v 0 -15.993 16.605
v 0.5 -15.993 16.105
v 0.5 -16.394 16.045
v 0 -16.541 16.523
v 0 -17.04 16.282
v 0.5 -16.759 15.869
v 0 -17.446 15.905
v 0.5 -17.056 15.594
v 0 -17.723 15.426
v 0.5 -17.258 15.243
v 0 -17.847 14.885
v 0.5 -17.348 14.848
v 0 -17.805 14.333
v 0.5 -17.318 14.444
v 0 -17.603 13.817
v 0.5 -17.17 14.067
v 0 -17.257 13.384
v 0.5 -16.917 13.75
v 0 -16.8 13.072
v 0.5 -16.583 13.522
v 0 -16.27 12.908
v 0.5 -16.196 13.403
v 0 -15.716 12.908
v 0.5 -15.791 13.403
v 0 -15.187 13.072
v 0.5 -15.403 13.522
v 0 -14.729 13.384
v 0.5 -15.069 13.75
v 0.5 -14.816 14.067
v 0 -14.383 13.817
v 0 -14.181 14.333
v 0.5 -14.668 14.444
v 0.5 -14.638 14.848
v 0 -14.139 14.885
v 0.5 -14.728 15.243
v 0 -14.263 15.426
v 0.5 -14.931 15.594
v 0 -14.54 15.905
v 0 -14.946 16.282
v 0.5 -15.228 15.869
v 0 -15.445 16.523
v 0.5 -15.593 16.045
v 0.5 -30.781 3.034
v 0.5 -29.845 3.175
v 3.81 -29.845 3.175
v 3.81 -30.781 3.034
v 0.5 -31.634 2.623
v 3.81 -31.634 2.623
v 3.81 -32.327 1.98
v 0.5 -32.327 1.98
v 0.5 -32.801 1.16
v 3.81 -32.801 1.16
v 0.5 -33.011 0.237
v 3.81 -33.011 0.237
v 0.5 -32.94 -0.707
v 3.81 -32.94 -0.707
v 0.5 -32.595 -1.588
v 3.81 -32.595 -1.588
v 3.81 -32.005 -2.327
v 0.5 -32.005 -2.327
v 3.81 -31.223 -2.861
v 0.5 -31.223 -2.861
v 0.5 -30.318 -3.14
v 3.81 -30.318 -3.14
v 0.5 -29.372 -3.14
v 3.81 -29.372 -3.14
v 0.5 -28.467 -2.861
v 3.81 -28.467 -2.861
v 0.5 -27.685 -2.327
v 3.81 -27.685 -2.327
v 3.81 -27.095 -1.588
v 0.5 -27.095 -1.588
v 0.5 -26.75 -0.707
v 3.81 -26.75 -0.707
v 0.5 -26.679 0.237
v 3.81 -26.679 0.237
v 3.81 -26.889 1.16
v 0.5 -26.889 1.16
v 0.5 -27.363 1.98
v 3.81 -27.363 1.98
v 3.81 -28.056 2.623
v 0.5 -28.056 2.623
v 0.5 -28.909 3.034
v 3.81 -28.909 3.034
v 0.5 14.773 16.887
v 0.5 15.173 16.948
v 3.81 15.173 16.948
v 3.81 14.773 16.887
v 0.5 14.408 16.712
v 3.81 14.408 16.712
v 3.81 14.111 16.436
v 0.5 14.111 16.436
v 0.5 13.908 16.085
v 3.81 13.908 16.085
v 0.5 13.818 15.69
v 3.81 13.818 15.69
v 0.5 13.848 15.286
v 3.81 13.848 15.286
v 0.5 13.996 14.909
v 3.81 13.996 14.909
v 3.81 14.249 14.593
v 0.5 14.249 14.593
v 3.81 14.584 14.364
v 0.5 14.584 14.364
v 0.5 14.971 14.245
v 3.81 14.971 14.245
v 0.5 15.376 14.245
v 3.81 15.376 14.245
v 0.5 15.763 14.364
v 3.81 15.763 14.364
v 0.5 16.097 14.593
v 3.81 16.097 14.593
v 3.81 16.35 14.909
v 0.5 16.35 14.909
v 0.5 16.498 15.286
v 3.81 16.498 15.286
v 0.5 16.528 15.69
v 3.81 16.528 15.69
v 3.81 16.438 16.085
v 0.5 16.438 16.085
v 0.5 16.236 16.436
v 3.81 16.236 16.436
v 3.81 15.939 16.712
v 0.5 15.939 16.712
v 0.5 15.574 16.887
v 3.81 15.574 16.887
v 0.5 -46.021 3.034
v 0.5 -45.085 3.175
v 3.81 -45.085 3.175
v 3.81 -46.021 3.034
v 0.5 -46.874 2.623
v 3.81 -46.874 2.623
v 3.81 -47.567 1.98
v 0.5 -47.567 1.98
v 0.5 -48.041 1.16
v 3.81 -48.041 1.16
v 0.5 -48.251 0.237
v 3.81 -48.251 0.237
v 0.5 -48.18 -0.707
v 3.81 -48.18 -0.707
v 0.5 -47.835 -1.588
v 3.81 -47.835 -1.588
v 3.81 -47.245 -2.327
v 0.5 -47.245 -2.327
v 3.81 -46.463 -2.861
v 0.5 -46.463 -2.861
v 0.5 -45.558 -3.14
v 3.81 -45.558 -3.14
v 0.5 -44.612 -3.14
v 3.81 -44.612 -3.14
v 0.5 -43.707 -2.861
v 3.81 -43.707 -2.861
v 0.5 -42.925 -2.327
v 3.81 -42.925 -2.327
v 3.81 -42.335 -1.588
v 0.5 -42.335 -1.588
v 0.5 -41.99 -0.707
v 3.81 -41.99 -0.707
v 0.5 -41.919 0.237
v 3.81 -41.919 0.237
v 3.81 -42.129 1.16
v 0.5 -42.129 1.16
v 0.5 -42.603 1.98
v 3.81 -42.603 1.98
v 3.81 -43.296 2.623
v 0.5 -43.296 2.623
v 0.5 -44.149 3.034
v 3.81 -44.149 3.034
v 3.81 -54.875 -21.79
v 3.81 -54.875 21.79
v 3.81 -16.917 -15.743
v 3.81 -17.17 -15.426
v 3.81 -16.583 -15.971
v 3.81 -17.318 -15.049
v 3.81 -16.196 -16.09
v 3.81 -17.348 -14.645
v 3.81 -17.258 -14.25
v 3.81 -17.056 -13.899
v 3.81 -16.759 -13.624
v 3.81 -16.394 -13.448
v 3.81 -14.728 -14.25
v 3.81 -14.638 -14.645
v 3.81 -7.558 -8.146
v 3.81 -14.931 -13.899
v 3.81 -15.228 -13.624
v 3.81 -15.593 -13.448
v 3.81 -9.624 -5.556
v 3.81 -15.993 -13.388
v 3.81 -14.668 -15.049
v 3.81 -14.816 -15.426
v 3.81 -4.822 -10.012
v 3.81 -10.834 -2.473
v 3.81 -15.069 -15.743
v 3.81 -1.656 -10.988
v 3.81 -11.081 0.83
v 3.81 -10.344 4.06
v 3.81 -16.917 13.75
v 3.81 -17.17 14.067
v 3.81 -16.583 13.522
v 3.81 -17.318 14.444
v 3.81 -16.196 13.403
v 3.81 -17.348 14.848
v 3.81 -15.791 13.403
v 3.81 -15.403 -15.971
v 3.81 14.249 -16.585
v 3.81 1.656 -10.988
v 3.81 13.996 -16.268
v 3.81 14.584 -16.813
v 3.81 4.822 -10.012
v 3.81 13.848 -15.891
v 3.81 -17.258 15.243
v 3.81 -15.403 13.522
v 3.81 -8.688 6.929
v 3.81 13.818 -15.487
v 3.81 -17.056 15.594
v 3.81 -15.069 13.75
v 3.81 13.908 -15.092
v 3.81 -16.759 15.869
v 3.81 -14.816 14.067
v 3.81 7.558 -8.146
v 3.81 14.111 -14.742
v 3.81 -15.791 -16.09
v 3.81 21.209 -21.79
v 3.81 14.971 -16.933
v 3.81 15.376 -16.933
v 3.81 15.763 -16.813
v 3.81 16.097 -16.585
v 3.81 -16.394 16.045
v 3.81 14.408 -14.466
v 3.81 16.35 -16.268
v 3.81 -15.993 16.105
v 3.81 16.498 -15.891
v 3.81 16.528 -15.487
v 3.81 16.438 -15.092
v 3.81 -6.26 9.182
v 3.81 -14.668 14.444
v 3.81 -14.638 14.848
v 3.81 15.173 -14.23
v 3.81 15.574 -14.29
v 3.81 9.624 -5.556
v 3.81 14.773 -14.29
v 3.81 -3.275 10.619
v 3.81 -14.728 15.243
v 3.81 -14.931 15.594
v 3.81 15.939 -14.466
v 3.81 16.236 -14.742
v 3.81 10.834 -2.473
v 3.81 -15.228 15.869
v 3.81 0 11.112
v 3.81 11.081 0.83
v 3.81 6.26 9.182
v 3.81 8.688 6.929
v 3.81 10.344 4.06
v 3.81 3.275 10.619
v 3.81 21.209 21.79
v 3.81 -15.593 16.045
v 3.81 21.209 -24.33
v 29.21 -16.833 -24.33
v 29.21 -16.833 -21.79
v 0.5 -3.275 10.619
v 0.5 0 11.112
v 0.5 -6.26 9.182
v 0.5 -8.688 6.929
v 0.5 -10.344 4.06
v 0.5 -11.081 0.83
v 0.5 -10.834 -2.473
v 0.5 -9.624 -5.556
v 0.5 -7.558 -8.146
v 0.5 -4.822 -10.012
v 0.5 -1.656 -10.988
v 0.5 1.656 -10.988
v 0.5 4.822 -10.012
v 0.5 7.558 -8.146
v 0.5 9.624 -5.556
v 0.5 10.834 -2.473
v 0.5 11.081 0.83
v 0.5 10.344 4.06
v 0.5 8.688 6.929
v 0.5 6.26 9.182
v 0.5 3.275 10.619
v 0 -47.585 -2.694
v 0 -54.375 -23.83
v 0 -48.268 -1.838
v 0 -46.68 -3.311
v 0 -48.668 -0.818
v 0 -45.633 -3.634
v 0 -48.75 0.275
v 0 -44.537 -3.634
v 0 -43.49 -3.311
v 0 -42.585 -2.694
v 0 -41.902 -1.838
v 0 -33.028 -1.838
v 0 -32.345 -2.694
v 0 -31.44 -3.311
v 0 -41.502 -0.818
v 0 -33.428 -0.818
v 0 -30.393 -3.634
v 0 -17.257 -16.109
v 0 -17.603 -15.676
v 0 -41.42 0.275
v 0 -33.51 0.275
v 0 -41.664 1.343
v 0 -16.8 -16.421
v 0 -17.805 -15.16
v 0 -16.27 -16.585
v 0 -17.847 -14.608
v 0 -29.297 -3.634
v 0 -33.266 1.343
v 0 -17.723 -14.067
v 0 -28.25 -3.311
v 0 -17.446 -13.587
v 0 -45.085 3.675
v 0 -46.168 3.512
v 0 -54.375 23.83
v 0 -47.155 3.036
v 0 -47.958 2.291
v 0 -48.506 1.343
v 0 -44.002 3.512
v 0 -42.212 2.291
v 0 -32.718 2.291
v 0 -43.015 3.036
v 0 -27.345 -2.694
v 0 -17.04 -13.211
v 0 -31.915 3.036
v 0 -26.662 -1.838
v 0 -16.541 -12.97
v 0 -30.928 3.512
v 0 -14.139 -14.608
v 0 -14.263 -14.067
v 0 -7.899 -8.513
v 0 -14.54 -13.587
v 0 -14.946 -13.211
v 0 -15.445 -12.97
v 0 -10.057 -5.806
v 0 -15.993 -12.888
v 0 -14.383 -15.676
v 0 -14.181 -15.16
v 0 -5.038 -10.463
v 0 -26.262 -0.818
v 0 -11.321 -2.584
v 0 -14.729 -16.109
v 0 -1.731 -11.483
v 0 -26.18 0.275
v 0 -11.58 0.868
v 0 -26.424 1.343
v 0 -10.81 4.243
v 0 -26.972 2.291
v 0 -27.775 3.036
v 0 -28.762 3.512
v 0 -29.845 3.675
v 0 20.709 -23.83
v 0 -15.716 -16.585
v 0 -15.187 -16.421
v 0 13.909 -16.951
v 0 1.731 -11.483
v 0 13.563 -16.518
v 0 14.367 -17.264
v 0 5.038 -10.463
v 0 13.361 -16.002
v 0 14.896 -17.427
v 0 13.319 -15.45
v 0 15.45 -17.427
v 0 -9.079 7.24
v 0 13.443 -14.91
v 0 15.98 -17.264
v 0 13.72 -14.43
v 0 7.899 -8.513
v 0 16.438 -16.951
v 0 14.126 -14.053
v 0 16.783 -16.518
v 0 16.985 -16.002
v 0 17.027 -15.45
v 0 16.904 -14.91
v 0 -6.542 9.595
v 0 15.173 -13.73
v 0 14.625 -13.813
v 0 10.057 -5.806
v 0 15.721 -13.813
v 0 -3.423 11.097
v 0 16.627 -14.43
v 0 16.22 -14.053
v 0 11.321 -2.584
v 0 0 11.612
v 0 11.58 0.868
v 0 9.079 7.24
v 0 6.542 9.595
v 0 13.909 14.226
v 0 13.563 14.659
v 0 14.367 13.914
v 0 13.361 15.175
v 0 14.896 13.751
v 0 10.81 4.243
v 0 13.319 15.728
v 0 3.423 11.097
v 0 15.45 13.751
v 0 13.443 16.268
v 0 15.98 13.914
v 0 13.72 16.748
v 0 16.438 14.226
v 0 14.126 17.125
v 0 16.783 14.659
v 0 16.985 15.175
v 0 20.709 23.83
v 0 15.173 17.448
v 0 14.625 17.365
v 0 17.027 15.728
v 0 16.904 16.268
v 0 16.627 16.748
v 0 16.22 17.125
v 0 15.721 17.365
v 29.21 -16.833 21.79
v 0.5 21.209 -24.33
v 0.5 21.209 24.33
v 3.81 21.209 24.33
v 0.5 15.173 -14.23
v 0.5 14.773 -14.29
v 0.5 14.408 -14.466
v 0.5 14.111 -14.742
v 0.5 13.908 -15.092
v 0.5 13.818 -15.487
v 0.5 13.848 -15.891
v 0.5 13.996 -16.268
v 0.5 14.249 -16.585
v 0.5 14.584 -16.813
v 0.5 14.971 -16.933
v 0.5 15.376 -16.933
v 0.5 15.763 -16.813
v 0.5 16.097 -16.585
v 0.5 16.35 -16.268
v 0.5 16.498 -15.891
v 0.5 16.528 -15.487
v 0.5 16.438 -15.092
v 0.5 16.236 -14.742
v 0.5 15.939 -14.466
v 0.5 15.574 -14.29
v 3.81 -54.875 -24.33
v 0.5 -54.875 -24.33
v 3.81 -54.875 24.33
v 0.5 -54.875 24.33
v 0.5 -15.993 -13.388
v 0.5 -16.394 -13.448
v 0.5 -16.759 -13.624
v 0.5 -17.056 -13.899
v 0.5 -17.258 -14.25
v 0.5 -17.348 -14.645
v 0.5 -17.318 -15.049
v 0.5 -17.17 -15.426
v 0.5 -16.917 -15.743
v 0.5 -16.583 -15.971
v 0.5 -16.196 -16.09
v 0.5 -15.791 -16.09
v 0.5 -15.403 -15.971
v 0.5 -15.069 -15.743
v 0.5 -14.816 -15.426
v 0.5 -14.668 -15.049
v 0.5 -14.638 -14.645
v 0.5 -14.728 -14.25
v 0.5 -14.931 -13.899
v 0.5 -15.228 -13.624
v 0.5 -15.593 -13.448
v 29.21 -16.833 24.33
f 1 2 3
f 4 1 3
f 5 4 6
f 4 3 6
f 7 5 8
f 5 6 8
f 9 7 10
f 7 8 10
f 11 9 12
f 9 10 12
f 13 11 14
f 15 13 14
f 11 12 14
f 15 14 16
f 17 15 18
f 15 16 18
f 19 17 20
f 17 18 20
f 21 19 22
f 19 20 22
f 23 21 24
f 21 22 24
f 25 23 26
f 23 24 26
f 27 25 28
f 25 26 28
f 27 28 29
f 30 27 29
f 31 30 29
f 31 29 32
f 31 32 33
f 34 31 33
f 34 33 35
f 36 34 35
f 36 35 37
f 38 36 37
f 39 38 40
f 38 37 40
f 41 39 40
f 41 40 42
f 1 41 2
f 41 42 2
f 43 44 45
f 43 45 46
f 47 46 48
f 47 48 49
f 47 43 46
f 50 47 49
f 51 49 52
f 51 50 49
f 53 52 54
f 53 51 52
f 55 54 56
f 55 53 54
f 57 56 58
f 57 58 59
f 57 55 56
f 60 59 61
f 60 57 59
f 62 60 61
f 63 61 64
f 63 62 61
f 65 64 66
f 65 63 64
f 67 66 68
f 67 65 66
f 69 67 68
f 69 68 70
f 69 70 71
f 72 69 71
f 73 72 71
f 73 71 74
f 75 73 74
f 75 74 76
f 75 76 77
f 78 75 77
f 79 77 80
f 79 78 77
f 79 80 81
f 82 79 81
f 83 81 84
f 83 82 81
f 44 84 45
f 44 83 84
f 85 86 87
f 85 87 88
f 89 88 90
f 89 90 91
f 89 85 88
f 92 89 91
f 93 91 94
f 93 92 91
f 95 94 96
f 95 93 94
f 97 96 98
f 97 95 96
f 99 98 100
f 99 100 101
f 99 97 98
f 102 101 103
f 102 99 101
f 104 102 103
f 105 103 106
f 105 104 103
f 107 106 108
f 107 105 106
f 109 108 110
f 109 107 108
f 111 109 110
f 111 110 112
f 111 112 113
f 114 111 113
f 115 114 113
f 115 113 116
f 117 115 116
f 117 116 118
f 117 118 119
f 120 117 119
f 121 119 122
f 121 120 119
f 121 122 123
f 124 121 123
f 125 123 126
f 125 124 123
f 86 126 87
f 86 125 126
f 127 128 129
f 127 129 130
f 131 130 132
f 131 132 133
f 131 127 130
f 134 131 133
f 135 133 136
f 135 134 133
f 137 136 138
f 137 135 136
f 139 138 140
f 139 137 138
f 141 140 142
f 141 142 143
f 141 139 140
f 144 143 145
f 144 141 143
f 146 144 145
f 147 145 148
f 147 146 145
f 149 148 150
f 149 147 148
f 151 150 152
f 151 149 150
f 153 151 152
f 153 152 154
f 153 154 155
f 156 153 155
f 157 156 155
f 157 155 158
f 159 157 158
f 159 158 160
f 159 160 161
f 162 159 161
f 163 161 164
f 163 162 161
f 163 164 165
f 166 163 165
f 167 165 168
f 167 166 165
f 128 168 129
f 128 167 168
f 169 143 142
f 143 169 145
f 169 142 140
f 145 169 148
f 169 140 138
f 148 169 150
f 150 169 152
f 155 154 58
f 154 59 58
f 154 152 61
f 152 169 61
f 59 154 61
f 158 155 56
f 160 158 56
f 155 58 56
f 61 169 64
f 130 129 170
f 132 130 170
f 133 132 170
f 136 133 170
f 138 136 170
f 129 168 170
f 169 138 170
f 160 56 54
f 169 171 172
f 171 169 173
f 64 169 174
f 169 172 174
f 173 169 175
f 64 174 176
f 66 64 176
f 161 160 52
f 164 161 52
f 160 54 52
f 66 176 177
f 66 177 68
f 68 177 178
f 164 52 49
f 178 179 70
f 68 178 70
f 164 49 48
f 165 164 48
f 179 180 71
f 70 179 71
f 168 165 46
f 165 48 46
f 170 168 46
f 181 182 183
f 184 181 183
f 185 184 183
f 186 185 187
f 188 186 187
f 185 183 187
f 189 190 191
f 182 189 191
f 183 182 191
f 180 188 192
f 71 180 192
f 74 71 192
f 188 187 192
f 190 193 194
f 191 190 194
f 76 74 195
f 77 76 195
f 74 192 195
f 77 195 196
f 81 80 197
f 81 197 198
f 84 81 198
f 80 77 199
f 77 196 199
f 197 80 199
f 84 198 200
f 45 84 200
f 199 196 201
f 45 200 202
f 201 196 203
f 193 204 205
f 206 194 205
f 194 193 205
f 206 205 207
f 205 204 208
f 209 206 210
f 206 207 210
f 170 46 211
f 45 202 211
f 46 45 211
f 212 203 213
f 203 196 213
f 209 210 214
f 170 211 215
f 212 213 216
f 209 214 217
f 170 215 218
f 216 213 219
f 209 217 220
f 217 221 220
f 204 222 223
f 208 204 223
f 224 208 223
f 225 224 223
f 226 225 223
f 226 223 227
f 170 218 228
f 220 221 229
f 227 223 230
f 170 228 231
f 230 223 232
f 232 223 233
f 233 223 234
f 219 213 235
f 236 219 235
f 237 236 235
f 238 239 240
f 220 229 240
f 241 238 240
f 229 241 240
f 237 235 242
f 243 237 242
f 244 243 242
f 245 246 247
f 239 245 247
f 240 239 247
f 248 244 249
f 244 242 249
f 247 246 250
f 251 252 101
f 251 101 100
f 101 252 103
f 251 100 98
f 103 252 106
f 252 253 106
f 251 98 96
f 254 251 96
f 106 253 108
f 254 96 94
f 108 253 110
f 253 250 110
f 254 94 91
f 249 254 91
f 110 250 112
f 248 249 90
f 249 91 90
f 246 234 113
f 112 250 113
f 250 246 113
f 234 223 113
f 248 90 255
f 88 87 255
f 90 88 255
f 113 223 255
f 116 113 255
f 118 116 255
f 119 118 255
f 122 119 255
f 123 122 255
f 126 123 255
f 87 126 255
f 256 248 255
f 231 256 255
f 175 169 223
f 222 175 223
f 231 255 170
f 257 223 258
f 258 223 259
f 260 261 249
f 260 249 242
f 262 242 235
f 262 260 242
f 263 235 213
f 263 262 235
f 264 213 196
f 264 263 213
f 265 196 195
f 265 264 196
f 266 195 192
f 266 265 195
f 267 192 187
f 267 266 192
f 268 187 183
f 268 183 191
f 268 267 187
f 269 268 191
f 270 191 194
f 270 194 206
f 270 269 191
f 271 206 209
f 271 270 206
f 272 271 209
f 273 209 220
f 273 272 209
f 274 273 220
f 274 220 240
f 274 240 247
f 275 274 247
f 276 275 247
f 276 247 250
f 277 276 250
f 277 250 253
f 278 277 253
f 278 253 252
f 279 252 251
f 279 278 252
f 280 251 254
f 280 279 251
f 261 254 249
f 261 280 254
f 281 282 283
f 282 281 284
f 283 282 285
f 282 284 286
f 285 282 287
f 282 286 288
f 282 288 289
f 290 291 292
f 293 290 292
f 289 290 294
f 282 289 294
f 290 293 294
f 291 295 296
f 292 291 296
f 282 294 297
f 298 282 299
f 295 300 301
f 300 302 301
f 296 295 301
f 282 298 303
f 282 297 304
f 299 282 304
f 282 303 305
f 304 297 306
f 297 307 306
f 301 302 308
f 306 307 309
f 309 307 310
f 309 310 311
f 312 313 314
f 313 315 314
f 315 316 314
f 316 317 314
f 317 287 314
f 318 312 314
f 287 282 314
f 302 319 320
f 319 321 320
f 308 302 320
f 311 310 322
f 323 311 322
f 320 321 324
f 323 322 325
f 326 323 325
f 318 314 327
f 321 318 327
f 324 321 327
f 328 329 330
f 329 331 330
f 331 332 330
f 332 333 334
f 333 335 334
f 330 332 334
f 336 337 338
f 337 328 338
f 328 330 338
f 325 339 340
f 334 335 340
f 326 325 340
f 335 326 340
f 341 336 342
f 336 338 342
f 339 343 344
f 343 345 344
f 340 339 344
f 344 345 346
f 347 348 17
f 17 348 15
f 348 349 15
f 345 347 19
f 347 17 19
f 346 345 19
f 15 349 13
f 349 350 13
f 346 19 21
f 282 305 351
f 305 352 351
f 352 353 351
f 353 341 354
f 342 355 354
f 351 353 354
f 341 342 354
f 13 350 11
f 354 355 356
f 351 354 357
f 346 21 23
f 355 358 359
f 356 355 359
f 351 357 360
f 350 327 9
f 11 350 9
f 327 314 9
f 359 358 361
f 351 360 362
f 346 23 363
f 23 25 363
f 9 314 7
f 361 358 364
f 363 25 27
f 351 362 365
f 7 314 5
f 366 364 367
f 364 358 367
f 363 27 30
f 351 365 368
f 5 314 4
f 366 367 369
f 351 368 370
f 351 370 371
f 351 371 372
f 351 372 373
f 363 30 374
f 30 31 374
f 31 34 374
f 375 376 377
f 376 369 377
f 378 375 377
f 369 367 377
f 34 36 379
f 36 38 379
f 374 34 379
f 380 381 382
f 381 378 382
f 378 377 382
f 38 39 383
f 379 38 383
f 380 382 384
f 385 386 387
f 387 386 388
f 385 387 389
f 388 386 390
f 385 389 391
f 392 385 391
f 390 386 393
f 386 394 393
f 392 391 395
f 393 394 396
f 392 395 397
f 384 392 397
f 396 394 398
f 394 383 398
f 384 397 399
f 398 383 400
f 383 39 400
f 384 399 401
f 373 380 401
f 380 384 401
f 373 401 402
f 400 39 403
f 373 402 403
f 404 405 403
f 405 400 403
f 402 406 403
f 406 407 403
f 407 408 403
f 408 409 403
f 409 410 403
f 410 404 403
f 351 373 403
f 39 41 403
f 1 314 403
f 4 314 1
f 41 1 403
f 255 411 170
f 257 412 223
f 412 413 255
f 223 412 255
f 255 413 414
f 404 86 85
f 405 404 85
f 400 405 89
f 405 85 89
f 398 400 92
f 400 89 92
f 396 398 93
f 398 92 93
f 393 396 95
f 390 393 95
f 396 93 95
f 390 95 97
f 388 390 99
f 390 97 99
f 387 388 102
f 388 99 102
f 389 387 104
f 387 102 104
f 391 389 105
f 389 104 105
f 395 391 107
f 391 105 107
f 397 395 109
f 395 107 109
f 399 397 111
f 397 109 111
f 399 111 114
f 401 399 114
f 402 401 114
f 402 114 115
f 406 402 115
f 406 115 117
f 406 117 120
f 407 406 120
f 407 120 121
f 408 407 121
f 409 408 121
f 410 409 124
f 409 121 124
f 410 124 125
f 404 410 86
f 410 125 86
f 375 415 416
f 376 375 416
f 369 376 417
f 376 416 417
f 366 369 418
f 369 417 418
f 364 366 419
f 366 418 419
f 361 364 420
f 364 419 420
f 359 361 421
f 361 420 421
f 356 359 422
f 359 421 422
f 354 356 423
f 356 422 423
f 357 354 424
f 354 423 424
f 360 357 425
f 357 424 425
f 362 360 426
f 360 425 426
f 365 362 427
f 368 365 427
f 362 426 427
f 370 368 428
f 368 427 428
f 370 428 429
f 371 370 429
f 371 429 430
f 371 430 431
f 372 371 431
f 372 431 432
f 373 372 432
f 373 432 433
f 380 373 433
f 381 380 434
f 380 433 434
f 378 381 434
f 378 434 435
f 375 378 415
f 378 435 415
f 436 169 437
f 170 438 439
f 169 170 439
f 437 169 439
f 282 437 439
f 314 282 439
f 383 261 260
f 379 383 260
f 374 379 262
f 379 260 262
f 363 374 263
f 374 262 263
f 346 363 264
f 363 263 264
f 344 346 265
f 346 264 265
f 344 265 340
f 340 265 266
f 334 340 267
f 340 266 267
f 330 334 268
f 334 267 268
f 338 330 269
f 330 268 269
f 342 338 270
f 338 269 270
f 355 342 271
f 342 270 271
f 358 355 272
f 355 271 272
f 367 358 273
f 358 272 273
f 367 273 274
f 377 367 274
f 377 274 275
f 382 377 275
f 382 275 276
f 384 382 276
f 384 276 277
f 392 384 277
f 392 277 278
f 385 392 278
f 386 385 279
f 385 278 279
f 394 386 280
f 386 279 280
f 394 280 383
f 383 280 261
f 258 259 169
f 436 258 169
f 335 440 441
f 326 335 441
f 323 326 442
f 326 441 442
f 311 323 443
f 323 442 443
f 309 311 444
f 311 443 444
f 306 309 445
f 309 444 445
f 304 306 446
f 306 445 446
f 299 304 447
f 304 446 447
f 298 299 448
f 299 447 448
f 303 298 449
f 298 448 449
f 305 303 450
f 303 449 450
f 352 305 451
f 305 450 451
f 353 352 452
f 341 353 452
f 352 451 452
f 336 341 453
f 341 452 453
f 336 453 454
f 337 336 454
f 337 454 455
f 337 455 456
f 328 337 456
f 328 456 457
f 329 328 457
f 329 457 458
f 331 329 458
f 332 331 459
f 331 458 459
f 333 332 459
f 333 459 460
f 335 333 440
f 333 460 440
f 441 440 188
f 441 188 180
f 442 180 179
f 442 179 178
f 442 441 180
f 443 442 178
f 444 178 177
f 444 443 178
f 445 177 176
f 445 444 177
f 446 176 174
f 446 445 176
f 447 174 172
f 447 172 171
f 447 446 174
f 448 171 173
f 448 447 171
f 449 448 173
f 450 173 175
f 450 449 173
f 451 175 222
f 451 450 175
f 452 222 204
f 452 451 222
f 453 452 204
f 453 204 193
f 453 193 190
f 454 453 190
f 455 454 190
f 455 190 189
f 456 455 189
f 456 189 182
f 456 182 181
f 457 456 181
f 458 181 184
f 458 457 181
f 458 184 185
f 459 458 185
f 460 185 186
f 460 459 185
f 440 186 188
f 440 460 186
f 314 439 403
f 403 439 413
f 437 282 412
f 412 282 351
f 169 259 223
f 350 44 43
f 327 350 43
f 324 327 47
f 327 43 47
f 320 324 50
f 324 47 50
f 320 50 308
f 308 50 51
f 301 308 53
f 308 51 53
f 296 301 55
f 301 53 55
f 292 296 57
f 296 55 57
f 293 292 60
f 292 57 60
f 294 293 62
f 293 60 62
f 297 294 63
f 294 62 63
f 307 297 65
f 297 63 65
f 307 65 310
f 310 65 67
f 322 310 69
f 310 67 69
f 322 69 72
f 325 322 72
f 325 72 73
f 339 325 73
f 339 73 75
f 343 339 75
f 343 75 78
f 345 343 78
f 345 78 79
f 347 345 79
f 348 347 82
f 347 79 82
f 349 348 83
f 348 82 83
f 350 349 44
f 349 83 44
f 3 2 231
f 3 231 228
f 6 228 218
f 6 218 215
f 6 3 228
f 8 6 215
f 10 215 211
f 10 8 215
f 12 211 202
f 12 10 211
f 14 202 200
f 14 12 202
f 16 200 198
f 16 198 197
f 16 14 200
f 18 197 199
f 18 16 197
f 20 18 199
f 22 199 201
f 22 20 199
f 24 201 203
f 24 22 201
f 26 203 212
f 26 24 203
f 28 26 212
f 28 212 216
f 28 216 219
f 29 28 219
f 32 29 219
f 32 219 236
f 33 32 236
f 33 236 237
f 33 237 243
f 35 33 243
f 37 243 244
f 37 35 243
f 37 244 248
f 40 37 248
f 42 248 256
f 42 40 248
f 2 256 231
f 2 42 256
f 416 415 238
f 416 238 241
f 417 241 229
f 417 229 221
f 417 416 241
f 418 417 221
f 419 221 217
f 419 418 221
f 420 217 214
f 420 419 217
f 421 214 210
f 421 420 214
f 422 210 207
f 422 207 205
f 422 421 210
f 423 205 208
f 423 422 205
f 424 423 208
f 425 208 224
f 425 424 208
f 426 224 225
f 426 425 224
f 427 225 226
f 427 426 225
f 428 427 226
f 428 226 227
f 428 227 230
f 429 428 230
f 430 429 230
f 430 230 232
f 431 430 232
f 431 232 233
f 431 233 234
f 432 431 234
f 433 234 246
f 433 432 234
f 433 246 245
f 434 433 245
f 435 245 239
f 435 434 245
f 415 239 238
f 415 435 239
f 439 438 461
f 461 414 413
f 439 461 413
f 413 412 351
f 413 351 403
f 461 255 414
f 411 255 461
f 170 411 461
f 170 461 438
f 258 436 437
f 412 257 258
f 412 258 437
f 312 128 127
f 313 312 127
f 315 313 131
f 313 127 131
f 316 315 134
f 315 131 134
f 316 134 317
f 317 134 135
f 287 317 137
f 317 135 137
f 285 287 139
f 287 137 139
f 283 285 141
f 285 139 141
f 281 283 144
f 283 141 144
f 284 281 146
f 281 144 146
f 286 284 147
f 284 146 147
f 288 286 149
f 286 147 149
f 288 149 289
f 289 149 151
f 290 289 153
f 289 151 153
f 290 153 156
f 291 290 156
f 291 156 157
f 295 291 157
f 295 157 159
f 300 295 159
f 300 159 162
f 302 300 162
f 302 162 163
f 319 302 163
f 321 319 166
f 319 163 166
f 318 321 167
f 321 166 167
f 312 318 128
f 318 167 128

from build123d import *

# Parameters (mm, degrees)
SKETCH1_R           = 11.1125
SKETCH1_R_2         = 1.3589
SKETCH1_R_3         = 3.175
BOSS_EXTRUDE1_DEPTH = 3.81
BOSS_EXTRUDE2_DEPTH = 2.54
CHAMFER1_SIZE       = 0.5


with BuildPart() as part:
    # Sketch1 → Boss-Extrude1 (new body)
    with BuildSketch(Plane(origin=(0, 0, 0), x_dir=(0, 0, -1), z_dir=(1, 0, 0))):
        Polygon((21.79, -21.209), (21.79, -54.874917619), (-21.79, -54.874917619), (-21.79, -21.209), (-21.79, 21.209), (21.79, 21.209), align=None)
        with Locations(Location((0, 0, 0), (0, 0, 180))):
            Circle(SKETCH1_R, mode=Mode.SUBTRACT)
        with Locations(Location((15.588824177, 15.173169893, 0), (0, 0, 180))):
            Circle(SKETCH1_R_2, mode=Mode.SUBTRACT)
        with Locations(Location((-15.588824177, 15.173169893, 0), (0, 0, 180))):
            Circle(SKETCH1_R_2, mode=Mode.SUBTRACT)
        with Locations(Location((-14.746436813, -15.993096172, 0), (0, 0, 180))):
            Circle(SKETCH1_R_2, mode=Mode.SUBTRACT)
        with Locations(Location((14.746436813, -15.993096172, 0), (0, 0, 180))):
            Circle(SKETCH1_R_2, mode=Mode.SUBTRACT)
        with Locations(Location((0, -29.845, 0), (0, 0, 180))):
            Circle(SKETCH1_R_3, mode=Mode.SUBTRACT)
        with Locations(Location((0, -45.085, 0), (0, 0, 180))):
            Circle(SKETCH1_R_3, mode=Mode.SUBTRACT)
    extrude(amount=BOSS_EXTRUDE1_DEPTH)

    # Sketch15 → Boss-Extrude2 (add)
    with BuildSketch(Plane.XY.offset(21.79)):
        Polygon((3.81, 21.209), (29.21, -16.832958809), (3.81, -54.874917619), (0, -54.874917619), (0, 21.209), align=None)
    boss_extrude2 = extrude(amount=BOSS_EXTRUDE2_DEPTH)

    # Mirror1: Boss-Extrude2 across plane
    add(boss_extrude2.mirror(Plane.XY))

    # Chamfer1
    chamfer1_edges = [part.edges().sort_by_distance(p)[0] for p in [
        (0, 0, -11.1125),
        (0, 15.173169893, -16.947724177),
        (0, 15.173169893, 14.229924177),
        (0, -15.993096172, 13.387536813),
        (0, -15.993096172, -16.105336813),
        (0, -29.845, -3.175),
        (0, -45.085, -3.175),
        (0, -16.832958809, 24.33),
        (0, -16.832958809, -24.33),
        (0, -54.874917619, 0),
        (0, 21.209, 0),
    ]]
    chamfer(chamfer1_edges, length=CHAMFER1_SIZE)


solid = part.part
